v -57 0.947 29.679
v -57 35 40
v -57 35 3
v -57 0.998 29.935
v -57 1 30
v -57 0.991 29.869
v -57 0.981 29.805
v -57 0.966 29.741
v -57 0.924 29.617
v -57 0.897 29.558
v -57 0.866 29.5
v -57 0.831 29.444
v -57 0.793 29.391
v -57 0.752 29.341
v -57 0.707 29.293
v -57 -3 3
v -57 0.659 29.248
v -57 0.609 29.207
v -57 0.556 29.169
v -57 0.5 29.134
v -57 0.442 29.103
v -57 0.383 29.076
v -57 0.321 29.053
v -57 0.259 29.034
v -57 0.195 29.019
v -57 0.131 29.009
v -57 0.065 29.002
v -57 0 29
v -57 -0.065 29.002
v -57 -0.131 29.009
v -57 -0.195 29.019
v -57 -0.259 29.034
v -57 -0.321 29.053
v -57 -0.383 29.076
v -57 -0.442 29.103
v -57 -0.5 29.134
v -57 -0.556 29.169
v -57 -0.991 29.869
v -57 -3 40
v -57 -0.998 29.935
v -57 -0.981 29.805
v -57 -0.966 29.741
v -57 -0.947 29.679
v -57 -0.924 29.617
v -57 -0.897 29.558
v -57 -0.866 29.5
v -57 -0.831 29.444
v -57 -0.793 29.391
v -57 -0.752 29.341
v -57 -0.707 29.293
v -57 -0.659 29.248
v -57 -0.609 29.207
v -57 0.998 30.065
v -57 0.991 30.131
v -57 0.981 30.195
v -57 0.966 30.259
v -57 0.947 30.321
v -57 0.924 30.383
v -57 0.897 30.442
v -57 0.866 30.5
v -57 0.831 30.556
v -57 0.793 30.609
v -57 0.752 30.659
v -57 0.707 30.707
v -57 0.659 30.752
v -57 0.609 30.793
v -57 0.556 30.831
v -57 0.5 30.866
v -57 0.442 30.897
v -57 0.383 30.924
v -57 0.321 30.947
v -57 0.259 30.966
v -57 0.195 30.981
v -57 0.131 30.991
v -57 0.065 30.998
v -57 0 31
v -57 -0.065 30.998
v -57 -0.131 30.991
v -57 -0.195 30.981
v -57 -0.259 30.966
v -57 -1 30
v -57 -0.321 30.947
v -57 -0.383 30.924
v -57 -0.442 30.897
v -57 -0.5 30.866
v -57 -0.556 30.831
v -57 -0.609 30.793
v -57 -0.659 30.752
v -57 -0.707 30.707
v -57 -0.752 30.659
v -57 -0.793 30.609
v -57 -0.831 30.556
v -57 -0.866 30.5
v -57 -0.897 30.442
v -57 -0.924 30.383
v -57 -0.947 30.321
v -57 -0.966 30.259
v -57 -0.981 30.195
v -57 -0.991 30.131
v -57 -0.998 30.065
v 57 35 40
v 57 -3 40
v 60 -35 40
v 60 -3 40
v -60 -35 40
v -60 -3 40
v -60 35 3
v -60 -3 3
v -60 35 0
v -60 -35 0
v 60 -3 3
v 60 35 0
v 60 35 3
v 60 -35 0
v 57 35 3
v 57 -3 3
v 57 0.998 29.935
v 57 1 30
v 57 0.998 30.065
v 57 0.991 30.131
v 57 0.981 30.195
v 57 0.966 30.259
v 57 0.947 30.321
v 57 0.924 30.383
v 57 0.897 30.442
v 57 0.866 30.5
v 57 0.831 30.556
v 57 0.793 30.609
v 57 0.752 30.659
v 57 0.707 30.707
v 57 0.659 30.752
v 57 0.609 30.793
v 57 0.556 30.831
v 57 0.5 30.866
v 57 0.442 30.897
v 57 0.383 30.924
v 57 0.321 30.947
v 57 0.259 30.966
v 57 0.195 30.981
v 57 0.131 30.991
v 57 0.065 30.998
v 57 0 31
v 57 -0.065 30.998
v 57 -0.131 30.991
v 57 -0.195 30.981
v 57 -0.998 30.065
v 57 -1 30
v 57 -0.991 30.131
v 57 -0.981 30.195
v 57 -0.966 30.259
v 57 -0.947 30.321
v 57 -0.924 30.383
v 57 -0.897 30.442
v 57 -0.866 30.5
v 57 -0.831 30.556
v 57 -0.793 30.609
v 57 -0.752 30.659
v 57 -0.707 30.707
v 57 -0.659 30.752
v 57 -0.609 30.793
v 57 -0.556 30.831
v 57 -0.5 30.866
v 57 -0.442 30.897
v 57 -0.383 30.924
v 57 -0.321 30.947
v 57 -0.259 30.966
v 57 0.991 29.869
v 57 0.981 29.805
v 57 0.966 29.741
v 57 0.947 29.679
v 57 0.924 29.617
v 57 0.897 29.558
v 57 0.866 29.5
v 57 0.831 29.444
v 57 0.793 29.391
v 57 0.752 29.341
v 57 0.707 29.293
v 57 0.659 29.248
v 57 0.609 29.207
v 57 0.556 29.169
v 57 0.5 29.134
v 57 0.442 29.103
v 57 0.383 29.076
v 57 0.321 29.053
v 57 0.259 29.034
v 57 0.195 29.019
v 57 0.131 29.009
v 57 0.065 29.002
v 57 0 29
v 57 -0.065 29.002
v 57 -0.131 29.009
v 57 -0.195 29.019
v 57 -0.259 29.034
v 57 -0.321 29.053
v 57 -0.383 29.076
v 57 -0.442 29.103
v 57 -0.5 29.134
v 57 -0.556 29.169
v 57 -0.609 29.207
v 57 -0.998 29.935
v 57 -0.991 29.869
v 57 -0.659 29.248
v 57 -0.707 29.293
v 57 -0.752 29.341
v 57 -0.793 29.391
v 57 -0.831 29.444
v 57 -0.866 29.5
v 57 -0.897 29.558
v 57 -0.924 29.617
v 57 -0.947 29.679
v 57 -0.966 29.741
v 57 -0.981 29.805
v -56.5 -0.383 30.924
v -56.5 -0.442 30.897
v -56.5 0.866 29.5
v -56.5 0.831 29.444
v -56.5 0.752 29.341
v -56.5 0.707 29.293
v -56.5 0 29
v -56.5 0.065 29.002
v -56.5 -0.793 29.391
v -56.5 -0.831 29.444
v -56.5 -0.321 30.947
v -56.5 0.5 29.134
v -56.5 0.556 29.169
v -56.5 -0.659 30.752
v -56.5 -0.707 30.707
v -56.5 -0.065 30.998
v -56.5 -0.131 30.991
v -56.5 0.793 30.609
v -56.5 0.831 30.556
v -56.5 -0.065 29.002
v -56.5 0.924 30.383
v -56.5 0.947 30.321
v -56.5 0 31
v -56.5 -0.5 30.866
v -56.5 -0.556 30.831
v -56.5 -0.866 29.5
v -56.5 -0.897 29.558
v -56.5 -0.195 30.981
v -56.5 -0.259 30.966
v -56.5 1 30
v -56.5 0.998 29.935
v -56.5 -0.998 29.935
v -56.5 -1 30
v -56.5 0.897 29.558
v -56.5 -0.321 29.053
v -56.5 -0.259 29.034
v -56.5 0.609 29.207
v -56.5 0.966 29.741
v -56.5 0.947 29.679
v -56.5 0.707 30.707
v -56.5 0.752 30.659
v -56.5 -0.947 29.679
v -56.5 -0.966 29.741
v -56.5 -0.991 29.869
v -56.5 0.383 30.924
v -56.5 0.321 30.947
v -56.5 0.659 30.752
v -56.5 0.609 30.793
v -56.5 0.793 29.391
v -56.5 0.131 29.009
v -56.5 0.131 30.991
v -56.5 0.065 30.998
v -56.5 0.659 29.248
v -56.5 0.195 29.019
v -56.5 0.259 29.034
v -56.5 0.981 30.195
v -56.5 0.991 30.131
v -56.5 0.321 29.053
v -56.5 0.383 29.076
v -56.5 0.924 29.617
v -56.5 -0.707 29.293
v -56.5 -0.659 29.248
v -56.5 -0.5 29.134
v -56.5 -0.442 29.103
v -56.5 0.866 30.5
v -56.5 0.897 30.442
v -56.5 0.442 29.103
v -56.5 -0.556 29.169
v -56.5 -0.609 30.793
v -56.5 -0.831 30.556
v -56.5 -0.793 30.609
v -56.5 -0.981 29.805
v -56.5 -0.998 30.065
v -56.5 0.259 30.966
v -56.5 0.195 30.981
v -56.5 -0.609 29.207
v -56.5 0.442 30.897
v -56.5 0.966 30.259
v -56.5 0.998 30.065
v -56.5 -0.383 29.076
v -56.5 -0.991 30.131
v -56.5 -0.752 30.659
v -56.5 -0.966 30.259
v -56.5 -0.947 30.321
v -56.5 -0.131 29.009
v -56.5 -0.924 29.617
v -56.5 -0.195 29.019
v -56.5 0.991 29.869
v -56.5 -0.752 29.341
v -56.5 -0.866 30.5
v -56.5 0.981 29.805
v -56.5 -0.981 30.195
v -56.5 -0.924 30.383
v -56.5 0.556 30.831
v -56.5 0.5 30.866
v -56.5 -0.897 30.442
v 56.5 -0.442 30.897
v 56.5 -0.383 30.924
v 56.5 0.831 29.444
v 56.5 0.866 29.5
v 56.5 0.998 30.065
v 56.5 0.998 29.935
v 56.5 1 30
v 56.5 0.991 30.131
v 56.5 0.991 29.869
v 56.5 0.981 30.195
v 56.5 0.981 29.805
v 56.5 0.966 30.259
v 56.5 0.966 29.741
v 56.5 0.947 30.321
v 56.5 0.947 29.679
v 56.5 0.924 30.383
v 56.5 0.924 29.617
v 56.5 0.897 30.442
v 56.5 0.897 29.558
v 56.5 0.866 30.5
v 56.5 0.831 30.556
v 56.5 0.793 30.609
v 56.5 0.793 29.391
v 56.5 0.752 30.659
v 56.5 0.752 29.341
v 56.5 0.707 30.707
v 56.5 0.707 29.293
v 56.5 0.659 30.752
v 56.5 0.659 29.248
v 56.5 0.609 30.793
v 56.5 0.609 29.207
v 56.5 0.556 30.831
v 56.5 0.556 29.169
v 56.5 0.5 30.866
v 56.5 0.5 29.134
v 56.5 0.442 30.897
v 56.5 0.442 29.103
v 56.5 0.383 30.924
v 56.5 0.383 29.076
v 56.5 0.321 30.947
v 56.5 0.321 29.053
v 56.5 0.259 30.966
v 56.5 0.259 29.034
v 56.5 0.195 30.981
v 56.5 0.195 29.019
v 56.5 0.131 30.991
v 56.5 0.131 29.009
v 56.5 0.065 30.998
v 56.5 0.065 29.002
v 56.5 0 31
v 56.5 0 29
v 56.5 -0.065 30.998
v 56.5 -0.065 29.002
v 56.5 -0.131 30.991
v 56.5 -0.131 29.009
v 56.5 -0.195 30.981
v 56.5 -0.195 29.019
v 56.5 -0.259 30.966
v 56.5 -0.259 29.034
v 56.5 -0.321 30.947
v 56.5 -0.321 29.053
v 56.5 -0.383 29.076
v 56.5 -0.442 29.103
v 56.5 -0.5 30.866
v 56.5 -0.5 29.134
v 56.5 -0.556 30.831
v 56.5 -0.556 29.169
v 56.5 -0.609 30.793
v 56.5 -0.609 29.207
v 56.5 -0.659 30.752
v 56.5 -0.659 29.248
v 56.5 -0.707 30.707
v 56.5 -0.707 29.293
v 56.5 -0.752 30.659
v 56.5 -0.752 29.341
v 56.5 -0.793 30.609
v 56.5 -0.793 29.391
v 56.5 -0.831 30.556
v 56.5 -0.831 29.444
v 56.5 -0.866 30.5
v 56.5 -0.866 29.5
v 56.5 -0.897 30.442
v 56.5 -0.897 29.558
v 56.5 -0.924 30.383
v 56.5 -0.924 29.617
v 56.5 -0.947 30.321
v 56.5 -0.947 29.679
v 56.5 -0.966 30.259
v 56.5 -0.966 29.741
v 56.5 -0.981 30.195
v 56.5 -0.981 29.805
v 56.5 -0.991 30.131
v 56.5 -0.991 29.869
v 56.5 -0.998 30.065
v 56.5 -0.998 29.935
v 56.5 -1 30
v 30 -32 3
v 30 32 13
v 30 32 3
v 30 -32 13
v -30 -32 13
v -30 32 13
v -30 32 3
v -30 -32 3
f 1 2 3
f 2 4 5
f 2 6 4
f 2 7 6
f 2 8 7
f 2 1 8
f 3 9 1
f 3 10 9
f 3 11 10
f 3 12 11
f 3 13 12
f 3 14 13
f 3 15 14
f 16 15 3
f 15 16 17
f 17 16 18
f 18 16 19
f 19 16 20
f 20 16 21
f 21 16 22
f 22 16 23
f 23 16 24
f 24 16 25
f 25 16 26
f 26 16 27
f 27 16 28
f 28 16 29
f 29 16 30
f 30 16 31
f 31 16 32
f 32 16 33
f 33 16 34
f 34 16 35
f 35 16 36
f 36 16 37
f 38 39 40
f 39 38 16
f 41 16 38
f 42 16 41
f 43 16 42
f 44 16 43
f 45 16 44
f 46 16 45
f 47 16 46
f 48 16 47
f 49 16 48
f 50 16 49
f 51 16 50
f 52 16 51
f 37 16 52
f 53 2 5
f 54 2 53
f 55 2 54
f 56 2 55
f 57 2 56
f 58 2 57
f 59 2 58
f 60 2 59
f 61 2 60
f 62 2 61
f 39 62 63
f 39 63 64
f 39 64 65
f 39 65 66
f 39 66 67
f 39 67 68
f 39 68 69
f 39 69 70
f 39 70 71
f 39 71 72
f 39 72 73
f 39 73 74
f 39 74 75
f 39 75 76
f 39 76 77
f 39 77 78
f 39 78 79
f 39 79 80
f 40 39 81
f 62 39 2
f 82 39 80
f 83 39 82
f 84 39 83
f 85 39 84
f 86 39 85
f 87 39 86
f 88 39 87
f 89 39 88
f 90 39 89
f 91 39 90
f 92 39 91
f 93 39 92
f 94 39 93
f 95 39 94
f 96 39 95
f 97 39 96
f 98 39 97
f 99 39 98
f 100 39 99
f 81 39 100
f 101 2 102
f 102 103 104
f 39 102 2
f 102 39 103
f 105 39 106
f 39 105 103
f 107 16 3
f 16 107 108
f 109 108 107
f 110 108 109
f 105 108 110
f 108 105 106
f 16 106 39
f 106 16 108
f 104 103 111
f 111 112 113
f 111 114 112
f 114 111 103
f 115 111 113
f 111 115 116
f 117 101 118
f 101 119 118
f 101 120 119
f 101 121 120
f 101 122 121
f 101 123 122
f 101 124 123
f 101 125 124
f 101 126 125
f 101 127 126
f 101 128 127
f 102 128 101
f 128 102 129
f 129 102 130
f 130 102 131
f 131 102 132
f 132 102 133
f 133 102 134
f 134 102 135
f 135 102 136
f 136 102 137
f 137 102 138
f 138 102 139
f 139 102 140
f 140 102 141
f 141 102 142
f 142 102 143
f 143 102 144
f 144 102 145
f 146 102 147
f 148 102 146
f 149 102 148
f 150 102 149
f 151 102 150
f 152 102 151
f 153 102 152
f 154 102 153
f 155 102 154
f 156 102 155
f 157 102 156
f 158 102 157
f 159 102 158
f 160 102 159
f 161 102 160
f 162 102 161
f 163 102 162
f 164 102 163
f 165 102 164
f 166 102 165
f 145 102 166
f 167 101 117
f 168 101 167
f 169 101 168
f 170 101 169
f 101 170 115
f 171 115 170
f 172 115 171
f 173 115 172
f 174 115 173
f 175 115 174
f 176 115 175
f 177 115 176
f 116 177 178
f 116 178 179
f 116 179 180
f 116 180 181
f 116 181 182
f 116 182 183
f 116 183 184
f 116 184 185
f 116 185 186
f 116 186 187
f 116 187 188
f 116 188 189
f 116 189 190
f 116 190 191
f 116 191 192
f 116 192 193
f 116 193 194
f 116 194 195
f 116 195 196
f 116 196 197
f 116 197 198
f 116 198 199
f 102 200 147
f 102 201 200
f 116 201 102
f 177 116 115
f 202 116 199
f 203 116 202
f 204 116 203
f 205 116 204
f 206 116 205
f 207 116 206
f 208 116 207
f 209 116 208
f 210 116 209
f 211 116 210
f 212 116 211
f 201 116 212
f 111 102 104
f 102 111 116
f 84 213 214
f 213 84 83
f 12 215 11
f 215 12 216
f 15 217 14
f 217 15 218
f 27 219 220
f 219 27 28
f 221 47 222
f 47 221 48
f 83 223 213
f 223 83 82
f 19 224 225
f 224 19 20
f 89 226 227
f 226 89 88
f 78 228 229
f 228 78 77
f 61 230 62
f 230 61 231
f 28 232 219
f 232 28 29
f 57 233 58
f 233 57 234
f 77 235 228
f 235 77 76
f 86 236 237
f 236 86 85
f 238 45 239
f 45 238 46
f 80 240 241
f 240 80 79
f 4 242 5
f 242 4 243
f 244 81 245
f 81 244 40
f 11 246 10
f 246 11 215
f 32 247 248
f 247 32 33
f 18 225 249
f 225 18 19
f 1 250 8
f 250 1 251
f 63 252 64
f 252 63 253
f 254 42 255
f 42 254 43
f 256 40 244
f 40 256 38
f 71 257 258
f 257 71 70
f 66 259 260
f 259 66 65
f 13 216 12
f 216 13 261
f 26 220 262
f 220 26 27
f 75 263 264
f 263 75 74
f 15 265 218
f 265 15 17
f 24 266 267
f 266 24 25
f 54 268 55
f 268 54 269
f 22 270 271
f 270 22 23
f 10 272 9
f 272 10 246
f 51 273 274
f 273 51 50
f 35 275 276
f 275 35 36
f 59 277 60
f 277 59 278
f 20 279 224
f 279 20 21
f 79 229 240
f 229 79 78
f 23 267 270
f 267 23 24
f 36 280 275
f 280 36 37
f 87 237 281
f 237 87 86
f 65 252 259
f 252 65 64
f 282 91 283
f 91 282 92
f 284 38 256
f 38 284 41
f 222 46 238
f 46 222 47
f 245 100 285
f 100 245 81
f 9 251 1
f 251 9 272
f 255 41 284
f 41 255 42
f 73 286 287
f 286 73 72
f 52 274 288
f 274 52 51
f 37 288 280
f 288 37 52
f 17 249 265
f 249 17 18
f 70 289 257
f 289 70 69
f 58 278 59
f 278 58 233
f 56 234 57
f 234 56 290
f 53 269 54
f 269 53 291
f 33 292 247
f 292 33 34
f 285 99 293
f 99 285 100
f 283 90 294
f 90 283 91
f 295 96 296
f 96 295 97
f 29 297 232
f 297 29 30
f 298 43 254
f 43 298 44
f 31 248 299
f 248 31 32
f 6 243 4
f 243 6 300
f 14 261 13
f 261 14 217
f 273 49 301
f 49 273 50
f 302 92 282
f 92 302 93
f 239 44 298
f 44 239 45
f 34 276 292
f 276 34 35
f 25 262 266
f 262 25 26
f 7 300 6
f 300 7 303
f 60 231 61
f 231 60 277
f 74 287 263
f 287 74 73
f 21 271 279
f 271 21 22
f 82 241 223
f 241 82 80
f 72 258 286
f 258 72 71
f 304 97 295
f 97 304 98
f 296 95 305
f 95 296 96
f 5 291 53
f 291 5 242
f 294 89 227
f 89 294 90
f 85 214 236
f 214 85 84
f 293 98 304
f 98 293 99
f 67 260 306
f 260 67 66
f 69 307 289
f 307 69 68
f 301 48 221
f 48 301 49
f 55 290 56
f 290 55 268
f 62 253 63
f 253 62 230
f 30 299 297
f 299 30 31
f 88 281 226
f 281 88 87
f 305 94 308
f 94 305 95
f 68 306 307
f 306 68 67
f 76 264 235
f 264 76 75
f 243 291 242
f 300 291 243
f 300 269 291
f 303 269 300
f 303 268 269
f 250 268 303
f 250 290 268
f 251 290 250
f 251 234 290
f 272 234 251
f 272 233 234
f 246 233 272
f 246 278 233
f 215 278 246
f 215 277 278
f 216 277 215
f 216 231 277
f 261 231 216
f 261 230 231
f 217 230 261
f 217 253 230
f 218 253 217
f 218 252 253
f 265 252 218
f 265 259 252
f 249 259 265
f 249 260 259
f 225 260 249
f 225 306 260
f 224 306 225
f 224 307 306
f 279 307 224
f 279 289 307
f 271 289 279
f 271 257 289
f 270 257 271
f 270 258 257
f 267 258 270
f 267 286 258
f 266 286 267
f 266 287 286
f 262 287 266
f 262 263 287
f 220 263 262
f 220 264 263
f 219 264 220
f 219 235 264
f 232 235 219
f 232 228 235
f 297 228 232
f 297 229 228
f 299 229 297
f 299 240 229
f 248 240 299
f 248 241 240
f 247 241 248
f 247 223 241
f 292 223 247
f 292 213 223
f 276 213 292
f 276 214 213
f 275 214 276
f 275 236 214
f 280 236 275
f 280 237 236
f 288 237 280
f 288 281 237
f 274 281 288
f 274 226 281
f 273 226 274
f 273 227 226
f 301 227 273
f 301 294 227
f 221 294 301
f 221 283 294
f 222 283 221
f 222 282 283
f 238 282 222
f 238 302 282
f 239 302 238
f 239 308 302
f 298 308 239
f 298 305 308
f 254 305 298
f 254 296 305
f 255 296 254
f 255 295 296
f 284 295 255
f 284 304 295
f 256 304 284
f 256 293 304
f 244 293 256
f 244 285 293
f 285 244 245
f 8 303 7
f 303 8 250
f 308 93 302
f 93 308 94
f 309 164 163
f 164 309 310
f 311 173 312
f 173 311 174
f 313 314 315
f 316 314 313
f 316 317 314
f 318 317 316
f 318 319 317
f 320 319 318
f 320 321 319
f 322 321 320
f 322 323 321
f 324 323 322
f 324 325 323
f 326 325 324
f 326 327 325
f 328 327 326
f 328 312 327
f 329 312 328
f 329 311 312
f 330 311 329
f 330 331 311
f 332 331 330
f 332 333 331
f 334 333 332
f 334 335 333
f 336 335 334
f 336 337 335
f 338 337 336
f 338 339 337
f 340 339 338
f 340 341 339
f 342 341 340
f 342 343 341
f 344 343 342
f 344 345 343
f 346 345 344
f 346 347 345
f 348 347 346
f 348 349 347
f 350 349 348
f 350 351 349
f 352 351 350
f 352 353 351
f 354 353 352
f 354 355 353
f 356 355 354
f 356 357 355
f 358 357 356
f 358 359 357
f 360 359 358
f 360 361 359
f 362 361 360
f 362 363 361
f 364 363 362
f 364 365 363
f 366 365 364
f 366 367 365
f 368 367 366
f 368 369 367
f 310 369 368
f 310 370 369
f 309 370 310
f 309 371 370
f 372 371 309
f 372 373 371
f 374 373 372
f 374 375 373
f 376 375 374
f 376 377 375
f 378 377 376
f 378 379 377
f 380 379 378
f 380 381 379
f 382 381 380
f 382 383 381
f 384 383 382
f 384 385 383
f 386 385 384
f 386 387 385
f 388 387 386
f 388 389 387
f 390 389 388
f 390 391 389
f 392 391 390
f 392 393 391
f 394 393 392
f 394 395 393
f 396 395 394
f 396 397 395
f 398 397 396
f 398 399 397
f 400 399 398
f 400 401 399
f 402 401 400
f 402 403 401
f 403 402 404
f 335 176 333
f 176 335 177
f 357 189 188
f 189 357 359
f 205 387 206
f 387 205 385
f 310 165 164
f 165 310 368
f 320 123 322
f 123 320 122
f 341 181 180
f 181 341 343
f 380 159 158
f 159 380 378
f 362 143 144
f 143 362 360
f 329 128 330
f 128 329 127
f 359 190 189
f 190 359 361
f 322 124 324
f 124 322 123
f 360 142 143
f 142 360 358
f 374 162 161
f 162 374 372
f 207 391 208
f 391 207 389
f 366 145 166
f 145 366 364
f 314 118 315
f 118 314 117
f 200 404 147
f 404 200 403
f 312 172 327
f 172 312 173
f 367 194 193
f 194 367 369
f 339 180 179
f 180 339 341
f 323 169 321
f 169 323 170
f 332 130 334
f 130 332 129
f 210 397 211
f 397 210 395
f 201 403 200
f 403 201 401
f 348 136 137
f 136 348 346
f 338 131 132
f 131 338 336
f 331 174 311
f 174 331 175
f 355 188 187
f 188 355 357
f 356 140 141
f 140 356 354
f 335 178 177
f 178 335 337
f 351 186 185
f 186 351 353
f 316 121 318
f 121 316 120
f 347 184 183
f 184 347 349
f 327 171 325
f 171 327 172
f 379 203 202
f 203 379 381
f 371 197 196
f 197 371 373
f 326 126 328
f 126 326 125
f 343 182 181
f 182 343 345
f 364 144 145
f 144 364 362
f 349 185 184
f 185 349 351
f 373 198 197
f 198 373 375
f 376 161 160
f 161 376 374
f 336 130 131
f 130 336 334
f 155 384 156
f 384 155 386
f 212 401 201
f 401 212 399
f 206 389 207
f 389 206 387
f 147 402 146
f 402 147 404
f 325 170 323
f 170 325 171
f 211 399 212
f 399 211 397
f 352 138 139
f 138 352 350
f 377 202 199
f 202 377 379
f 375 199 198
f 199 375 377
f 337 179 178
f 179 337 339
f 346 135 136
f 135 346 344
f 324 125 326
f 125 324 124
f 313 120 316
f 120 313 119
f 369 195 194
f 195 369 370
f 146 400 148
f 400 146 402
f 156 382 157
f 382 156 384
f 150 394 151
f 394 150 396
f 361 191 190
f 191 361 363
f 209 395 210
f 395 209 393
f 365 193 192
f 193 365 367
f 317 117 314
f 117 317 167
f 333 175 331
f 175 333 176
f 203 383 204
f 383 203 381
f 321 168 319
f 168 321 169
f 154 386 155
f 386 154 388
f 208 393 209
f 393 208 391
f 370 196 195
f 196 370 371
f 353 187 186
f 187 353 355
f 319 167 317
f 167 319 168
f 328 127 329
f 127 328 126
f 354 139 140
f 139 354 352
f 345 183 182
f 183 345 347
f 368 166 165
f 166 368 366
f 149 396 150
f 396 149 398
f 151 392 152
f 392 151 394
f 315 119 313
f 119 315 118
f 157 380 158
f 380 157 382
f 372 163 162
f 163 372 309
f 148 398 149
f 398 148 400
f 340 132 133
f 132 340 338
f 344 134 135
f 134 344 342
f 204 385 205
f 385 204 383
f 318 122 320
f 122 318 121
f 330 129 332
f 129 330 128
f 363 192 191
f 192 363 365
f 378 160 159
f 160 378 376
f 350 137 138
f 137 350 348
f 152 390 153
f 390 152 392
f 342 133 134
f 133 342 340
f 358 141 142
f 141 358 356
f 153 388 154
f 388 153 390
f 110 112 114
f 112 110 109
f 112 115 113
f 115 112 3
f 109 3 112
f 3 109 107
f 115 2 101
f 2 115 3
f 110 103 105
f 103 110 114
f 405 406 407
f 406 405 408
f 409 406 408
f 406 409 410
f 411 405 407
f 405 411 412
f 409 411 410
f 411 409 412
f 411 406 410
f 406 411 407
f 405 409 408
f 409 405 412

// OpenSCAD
// Mini horizontal gel-electrophoresis buffer tank
// Print orientation: open top facing up (+Z), resting on XY plane at z = 0

// ---------------- Parameters ----------------
tank_x      = 120;   // outer length in X (mm)
tank_y      = 70;    // outer width in Y (mm)
tank_h      = 40;    // outer height in Z (mm)
wall        = 3;     // wall thickness (mm)
floor       = 3;     // floor thickness (mm)

platform_x  = 60;    // platform length in X (mm), centred
platform_y  = tank_y - 2 * wall;  // platform spans full inner width
platform_top = floor + 10;  // platform top height = z = 13 (10 mm above inner floor)
platform_h  = platform_top - floor;  // platform height (10 mm)

hole_d      = 2;     // electrode hole diameter (mm)
hole_y      = 0;     // electrode hole Y position (mm)
hole_z      = 30;    // electrode hole Z position (mm)

eps         = 0.5;   // cutter overshoot past faces (mm)

$fn = 96;

// ---------------- Derived ----------------
inner_x = tank_x - 2 * wall;   // 114 mm
inner_y = tank_y - 2 * wall;   // 64 mm
inner_floor_z = floor;         // z = 3 (bottom of inner space)

// ---------------- Model ----------------
difference() {
    // Outer tank body
    translate([-tank_x / 2, -tank_y / 2, 0])
        cube([tank_x, tank_y, tank_h]);

    // Open top (no lid)

    // End walls (through which electrode holes are drilled)
    for (sx = [-1, 1])
        translate([sx > 0 ? tank_x / 2 - wall : -tank_x / 2, -wall, floor])
            cube([wall, inner_y, tank_h - floor]);   // x end wall, floor-thick at bottom

    // Raised platform in the middle, centred in X
    translate([-platform_x / 2, -platform_y / 2, platform_top - platform_h])
        cube([platform_x, platform_y, platform_h]);

    // Horizontal electrode holes along X, through each end wall
    for (sx = [-1, 1])
        translate([sx * (tank_x / 2 - wall / 2), hole_y, hole_z])
            rotate([0, 90, 0])
                cylinder(d = hole_d, h = wall + 2 * eps, center = true);
}
